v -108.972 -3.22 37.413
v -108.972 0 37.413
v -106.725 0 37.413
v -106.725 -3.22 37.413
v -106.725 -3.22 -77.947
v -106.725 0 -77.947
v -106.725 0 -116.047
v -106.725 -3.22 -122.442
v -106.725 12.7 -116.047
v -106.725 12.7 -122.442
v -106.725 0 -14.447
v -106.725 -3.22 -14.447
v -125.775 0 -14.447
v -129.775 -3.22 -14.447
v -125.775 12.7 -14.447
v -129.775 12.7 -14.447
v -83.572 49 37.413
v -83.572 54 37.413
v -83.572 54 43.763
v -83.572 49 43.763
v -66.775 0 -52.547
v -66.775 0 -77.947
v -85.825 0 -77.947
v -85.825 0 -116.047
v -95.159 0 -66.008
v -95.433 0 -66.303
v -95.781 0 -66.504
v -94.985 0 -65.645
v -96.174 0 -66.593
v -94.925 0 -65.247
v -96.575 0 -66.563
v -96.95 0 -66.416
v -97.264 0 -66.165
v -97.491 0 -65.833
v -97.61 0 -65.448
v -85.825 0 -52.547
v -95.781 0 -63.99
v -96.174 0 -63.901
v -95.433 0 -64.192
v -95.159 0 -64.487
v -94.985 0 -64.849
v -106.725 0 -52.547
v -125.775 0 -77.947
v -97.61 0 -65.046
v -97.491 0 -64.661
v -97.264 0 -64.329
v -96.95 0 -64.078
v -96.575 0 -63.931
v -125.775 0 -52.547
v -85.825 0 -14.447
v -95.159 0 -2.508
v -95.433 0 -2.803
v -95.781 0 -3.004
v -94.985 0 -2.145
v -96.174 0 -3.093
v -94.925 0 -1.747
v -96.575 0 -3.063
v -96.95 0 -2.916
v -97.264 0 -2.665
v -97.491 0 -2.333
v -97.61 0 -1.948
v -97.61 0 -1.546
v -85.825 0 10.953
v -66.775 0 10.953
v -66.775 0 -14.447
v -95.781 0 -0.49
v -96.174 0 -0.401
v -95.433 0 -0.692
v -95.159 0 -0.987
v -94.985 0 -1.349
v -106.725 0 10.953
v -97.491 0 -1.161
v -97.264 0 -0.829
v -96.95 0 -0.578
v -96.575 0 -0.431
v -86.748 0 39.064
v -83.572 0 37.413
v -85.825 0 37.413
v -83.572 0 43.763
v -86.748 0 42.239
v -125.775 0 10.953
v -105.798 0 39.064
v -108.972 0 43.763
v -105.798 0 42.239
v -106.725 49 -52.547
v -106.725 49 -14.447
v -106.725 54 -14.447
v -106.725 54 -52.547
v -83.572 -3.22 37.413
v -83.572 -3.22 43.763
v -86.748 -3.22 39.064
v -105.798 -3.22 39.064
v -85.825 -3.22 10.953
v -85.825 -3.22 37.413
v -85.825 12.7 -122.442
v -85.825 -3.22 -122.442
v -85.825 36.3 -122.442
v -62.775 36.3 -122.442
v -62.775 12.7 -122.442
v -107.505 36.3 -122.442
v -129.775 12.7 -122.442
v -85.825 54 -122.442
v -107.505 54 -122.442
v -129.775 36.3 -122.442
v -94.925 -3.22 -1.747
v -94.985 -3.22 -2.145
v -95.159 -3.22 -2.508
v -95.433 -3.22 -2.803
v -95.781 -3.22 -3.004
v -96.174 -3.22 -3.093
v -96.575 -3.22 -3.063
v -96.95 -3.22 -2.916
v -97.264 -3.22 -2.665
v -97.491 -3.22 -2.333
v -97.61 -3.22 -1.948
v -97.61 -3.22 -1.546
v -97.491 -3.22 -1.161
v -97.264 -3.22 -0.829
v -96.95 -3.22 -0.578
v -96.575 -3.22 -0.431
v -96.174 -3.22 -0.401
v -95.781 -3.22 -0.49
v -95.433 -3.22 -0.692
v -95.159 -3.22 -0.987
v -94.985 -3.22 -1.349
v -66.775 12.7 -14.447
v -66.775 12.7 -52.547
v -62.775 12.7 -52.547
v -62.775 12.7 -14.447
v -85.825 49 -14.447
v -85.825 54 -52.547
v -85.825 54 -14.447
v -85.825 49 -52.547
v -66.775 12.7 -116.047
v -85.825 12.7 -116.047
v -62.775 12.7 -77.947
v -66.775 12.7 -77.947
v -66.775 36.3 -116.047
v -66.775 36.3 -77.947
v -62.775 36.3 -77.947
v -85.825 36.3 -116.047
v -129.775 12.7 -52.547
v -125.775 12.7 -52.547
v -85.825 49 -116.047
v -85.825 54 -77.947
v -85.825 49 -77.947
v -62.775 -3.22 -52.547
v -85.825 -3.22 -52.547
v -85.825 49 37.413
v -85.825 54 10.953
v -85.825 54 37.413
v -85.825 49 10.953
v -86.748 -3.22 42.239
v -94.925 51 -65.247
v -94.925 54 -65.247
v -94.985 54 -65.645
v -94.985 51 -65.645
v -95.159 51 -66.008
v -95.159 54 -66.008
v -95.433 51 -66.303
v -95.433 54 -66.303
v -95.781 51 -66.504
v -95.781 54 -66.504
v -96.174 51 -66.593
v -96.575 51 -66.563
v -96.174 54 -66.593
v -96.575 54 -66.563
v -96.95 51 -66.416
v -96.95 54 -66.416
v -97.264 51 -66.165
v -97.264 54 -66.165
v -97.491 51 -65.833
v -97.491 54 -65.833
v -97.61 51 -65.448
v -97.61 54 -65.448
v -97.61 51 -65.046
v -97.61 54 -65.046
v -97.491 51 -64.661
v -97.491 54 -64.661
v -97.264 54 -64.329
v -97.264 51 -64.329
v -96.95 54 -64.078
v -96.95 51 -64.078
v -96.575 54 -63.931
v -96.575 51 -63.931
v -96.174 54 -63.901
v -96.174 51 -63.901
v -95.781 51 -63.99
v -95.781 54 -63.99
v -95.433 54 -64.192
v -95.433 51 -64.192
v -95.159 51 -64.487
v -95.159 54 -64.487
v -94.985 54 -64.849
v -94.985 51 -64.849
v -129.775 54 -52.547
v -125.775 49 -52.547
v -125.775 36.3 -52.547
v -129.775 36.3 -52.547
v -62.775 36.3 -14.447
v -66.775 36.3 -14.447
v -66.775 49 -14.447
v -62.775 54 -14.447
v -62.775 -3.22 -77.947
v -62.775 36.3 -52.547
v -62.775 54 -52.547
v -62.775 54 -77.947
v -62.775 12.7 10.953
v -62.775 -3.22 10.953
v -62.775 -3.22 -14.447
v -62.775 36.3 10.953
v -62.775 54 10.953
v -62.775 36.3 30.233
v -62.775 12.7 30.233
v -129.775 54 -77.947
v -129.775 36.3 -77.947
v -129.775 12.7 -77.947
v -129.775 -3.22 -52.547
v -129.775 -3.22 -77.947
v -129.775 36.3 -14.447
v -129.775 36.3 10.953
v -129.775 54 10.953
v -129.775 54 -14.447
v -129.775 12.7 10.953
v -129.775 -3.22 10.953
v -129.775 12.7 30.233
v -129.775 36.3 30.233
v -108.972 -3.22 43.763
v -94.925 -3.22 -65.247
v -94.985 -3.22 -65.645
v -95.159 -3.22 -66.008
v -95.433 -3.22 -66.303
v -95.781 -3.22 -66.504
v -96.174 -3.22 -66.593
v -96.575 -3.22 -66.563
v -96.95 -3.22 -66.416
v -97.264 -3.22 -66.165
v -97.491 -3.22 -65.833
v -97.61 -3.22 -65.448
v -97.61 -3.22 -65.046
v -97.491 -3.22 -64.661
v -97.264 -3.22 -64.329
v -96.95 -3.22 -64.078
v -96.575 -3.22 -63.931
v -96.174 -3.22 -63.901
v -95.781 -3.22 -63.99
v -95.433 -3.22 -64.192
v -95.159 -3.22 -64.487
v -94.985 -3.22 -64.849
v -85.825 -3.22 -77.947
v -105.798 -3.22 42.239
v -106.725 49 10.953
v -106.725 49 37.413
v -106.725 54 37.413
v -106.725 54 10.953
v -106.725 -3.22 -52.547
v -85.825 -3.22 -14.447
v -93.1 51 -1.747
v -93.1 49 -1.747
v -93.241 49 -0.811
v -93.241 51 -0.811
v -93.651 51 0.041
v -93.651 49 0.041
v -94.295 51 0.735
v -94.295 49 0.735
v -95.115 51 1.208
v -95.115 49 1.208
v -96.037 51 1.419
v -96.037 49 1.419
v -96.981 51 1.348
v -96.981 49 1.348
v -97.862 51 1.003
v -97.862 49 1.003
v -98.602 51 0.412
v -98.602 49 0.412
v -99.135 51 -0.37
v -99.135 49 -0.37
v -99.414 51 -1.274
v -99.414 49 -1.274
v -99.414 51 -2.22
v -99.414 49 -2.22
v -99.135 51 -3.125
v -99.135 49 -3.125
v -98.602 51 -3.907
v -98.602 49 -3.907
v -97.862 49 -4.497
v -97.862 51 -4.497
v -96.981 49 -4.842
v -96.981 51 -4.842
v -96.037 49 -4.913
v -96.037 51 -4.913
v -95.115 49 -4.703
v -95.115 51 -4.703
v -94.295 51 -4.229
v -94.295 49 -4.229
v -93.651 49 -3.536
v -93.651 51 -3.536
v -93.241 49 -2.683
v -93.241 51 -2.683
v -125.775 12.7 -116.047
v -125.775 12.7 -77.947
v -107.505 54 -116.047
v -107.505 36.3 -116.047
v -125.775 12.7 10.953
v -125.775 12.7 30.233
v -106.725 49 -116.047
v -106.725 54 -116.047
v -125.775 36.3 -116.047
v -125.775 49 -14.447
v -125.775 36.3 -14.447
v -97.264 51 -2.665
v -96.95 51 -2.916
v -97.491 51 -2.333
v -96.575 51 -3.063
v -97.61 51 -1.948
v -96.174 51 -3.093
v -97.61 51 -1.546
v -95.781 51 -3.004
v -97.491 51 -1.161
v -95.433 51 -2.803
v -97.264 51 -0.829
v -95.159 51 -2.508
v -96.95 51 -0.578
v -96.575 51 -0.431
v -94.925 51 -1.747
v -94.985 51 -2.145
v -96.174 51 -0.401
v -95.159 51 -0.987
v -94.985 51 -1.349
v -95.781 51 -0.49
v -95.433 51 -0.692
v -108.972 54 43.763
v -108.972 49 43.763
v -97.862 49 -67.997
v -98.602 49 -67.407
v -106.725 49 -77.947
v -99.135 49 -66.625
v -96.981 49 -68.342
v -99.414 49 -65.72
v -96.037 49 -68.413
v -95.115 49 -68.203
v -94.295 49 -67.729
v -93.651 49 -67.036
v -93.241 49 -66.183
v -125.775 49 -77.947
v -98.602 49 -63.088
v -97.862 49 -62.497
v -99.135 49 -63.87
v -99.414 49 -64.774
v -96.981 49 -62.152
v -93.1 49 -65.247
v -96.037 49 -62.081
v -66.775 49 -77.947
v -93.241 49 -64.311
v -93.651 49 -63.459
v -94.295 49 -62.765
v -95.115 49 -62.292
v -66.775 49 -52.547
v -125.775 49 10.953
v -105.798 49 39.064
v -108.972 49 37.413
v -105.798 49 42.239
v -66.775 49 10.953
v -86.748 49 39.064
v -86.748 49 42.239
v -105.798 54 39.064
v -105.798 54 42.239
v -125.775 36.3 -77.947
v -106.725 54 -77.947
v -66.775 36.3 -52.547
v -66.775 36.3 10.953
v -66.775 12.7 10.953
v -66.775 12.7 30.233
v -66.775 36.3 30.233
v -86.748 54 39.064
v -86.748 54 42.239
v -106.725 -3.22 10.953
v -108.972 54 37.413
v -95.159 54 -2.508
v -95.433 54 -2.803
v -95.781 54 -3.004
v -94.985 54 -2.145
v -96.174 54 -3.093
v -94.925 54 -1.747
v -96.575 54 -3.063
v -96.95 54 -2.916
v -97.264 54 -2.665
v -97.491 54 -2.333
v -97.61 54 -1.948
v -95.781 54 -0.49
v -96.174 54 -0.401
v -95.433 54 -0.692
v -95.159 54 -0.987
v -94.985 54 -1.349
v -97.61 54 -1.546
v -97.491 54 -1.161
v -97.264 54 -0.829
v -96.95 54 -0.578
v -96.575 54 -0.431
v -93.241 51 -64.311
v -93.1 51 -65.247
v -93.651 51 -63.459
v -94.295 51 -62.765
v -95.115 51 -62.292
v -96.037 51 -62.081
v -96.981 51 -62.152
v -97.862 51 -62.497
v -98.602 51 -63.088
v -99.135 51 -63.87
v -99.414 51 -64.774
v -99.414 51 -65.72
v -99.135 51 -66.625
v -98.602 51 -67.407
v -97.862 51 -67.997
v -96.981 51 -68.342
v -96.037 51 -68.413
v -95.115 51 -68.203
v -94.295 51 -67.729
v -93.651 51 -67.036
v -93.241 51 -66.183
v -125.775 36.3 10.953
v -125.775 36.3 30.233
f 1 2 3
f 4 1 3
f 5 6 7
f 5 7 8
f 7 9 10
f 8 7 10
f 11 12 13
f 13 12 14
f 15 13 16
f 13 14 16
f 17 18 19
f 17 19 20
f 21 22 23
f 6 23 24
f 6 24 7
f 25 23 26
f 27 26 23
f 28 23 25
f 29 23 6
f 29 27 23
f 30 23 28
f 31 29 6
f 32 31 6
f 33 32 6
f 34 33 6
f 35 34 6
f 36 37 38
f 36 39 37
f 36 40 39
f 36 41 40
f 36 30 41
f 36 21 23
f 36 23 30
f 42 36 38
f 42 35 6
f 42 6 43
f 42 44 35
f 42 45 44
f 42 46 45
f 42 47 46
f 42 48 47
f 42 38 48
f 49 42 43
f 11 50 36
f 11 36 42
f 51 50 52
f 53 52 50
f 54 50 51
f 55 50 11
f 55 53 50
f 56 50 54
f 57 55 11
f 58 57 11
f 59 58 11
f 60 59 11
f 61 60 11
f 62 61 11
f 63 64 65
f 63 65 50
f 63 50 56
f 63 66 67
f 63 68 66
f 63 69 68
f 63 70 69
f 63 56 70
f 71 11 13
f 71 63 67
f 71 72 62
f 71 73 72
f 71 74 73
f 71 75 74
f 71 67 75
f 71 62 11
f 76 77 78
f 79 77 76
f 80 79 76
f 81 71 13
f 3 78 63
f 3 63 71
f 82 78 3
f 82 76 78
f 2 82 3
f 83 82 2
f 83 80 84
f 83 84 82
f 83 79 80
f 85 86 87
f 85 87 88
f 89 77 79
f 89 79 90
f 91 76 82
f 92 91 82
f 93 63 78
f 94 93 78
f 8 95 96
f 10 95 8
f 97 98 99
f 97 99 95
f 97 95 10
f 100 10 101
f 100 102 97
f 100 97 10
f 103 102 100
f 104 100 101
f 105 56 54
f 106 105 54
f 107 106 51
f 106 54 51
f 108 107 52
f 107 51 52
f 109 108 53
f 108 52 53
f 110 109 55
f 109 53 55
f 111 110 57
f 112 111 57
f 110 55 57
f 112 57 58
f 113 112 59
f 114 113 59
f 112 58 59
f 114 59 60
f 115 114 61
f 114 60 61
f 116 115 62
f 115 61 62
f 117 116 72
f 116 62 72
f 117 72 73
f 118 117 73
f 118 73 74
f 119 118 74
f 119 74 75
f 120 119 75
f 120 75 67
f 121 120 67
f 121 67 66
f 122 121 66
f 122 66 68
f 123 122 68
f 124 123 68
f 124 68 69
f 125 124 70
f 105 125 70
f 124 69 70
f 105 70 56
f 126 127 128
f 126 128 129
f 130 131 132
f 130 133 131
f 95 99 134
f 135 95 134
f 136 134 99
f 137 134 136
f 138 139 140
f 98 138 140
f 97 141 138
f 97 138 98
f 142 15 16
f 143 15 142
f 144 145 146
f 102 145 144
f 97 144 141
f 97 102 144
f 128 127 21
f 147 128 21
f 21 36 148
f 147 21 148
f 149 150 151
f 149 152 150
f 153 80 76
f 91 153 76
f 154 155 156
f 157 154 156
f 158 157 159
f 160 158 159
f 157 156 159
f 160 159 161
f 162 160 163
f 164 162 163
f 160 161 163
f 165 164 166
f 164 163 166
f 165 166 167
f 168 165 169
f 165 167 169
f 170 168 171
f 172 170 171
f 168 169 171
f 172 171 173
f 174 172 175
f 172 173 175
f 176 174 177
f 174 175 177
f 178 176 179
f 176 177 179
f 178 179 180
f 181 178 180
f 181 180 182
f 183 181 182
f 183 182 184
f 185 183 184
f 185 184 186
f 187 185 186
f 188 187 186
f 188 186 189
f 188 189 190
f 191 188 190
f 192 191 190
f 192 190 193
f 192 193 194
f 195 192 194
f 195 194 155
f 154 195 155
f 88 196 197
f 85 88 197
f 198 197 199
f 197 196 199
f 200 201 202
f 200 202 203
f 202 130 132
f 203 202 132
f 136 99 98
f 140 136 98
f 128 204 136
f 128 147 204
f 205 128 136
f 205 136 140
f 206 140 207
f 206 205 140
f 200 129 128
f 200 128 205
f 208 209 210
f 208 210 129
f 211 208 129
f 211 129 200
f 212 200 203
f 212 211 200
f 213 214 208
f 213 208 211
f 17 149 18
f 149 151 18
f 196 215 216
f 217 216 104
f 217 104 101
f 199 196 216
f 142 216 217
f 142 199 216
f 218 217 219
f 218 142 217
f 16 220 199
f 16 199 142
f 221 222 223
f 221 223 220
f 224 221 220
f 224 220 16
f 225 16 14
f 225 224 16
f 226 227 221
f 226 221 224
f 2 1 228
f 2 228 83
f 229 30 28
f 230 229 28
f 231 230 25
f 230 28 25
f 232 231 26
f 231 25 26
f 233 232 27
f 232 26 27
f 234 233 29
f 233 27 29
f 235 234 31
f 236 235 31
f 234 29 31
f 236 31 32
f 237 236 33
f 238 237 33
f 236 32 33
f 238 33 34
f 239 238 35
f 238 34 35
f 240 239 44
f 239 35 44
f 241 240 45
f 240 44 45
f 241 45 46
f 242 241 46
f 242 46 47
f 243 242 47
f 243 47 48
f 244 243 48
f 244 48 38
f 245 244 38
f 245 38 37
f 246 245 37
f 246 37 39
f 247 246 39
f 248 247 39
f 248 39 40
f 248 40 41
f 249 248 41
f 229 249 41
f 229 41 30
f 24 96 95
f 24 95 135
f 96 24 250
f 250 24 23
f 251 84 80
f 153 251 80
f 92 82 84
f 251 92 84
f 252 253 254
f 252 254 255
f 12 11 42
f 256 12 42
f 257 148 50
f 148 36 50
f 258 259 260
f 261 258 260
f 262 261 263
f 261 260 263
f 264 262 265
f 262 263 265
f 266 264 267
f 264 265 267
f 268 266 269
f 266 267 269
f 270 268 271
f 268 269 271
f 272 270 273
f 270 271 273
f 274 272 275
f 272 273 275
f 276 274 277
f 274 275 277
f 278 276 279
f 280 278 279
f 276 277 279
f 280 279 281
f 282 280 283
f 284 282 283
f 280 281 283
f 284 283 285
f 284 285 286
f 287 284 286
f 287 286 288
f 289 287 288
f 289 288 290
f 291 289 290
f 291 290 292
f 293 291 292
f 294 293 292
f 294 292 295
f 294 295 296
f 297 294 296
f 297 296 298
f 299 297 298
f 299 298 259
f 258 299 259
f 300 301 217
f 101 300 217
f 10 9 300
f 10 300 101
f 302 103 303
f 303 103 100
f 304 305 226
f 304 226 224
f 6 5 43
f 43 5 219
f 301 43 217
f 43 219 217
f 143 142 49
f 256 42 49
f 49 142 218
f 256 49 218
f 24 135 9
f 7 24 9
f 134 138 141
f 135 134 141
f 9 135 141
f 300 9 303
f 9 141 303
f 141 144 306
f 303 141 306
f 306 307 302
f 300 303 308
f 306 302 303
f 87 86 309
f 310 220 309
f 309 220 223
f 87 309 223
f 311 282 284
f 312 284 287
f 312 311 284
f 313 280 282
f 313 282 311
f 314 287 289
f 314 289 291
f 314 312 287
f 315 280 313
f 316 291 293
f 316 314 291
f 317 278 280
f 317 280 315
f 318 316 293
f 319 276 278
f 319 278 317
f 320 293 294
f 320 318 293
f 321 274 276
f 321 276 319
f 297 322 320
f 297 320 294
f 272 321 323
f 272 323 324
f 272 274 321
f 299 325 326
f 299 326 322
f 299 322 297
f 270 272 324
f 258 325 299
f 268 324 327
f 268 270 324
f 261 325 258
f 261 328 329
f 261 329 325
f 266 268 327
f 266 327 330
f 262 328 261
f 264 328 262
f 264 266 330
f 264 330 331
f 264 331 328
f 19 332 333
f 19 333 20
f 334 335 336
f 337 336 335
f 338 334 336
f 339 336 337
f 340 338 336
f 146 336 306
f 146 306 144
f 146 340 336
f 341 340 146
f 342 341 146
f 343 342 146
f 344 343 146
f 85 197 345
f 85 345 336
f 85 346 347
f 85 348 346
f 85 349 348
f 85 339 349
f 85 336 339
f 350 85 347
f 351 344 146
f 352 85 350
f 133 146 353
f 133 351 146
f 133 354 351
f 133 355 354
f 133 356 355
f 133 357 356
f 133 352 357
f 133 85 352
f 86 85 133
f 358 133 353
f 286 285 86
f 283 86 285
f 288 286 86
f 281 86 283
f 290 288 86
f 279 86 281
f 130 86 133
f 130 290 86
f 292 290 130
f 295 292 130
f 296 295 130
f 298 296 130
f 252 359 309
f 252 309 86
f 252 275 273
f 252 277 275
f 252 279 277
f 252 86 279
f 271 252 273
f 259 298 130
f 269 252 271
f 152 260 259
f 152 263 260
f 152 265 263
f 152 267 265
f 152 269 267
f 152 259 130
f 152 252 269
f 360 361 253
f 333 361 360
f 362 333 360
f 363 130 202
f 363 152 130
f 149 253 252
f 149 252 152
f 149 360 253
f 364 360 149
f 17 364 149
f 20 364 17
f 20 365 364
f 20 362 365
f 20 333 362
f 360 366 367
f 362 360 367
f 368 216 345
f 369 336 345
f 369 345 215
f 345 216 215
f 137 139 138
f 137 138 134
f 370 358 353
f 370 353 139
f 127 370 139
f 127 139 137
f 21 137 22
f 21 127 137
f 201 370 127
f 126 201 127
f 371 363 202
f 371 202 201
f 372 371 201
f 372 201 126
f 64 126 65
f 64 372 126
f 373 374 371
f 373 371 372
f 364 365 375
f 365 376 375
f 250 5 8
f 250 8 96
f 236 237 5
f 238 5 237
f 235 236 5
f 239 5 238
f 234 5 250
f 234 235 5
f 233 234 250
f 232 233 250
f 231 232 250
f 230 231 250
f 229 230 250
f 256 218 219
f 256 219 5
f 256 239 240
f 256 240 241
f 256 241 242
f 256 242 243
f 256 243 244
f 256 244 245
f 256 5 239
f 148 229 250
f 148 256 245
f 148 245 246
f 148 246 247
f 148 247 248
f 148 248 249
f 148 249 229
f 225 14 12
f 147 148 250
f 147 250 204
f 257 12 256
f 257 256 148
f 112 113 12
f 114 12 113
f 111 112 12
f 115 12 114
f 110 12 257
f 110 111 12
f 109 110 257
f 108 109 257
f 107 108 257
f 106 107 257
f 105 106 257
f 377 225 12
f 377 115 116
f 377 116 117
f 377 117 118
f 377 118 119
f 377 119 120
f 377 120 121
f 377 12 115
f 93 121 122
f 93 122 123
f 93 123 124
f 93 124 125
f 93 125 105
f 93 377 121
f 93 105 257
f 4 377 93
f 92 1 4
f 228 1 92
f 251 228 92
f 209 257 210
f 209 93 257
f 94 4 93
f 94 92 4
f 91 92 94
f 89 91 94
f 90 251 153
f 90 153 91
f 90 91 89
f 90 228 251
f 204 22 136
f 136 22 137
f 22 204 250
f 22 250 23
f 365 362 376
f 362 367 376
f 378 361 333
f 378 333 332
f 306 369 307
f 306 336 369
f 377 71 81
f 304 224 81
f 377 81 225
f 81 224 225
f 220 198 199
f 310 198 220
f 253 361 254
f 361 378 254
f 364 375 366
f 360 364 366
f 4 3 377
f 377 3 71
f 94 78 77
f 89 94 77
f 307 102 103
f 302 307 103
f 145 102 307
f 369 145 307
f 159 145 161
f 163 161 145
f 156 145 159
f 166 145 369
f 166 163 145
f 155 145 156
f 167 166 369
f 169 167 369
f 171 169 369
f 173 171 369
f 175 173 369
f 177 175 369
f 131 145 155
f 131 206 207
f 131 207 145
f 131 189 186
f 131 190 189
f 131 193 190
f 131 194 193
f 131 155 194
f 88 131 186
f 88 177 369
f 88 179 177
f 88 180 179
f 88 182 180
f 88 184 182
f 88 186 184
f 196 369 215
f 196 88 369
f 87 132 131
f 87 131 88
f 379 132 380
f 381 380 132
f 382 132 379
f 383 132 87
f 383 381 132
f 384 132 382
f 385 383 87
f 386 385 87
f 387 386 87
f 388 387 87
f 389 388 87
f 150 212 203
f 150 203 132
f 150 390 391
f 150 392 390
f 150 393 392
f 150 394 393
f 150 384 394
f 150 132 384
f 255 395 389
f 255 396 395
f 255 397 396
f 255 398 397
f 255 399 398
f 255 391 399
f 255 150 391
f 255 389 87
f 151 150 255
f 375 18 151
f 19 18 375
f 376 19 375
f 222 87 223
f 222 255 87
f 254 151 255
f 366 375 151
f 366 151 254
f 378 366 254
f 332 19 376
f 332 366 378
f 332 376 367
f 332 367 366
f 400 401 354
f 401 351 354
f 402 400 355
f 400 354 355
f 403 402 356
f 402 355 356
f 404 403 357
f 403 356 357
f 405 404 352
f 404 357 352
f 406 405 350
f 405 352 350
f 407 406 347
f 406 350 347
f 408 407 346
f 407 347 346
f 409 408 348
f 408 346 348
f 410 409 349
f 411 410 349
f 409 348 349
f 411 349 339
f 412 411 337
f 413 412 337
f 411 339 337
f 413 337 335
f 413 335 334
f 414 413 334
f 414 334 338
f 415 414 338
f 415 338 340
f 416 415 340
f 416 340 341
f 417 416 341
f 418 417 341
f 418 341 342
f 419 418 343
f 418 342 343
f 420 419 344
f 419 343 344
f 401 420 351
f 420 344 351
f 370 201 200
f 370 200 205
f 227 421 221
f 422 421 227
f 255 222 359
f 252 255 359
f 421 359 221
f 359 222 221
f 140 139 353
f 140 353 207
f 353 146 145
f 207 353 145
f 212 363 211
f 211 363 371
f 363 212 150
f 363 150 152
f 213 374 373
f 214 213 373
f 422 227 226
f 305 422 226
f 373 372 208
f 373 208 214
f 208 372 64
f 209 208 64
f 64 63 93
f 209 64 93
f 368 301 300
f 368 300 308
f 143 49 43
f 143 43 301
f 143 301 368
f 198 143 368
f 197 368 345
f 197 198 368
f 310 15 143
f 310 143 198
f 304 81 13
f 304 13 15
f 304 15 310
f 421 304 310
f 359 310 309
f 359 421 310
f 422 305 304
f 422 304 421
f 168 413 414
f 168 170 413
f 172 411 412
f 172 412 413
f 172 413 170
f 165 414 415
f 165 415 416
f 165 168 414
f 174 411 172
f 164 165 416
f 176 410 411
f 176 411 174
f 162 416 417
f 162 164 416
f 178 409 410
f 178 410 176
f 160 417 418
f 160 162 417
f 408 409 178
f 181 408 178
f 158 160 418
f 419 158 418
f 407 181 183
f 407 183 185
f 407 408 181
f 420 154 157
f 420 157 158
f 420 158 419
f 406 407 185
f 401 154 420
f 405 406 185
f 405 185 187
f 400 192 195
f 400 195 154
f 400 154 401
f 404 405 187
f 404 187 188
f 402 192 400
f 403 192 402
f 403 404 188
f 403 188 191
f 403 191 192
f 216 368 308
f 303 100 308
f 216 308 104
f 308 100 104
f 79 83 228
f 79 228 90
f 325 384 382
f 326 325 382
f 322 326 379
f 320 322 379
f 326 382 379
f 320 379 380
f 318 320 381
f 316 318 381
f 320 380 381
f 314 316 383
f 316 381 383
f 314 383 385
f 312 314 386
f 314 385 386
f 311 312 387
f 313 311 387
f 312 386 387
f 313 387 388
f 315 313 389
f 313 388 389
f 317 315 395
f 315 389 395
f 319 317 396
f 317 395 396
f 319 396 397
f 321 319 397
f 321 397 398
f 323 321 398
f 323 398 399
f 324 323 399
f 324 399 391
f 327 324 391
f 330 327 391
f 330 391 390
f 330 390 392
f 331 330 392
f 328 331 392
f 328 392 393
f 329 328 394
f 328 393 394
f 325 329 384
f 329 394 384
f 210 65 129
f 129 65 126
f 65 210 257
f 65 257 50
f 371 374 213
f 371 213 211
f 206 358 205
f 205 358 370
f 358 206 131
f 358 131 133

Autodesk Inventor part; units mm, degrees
ref_plane "YZ Plane" through (0, 0, 0) normal (1, 0, 0) x (0, 1, 0)
ref_plane "XZ Plane" through (0, 0, 0) normal (0, 1, 0) x (-1, 0, 0)
ref_plane "XY Plane" through (0, 0, 0) normal (0, 0, 1) x (1, 0, 0)
sketch "Sketch1" plane through (0, 0, 0) normal (0, 1, 0) x (-1, 0, 0)
  line L0 (125.7746, -116.0471) -> (66.7746, -116.0471)
  line L1 (66.7746, -116.0471) -> (66.7746, 37.4129)
  line L2 (66.7746, 37.4129) -> (125.7746, 37.4129)
  line L3 (125.7746, 37.4129) -> (125.7746, -116.0471)
  point P0 (0, 0)
  dimension "d0" = 59
  dimension "d1" = 153.46
extrude "Extrusion1" add sketch "Sketch1" along normal blind 49
sketch "Sketch2" plane through (0, 0, 0) normal (0, -1, 0) x (1, 0, 0)
  line L0 (-125.7746, 37.4129) -> (-66.7746, 37.4129) projected
  line L1 (-66.7746, -116.0471) -> (-125.7746, -116.0471) projected
  line L2 (-85.8246, 37.4129) -> (-106.7246, 37.4129)
  line L3 (-106.7246, 37.4129) -> (-106.7246, -116.0471)
  line L4 (-106.7246, -116.0471) -> (-85.8246, -116.0471)
  line L5 (-85.8246, -116.0471) -> (-85.8246, 37.4129)
  line L6 (-66.7746, 37.4129) -> (-66.7746, -116.0471) projected
  line L7 (-125.7746, -116.0471) -> (-125.7746, 37.4129) projected
  point P0 (0, 0)
  dimension "d4" = 19.05
  dimension "d5" = 19.05
extrude "Extrusion2" add sketch "Sketch2" along normal blind 3.22 contours L0 L5 L1 L3
sketch "Sketch3" plane through (0, 49, 0) normal (0, 1, 0) x (1, 0, 0)
  line L0 (-125.7746, -37.4129) -> (-66.7746, -37.4129) projected
  line L1 (-106.7246, 116.0471) -> (-125.7746, 116.0471) projected
  line L2 (-85.8246, -37.4129) -> (-106.7246, -37.4129)
  line L3 (-106.7246, -37.4129) -> (-106.7246, 116.0471)
  line L4 (-106.7246, 116.0471) -> (-85.8246, 116.0471)
  line L5 (-85.8246, 116.0471) -> (-85.8246, -37.4129)
  line L6 (-66.7746, -37.4129) -> (-66.7746, 116.0471) projected
  line L7 (-125.7746, 116.0471) -> (-125.7746, -37.4129) projected
  point P0 (0, 0)
  dimension "d8" = 19.05
  dimension "d9" = 19.05
extrude "Extrusion3" add sketch "Sketch3" along normal blind 5 contours L3 L4 L5 L0
sketch "Sketch4" plane through (-66.7746, 0, 37.4129) normal (1, 0, 0) x (0, 0, -1)
  line L0 (0, 0) -> (0, 49) projected
  line L1 (153.46, 0) -> (153.46, 49) projected
  line L2 (0, 36.3) -> (153.46, 36.3)
  line L3 (153.46, 36.3) -> (153.46, 12.7)
  line L4 (153.46, 12.7) -> (0, 12.7)
  line L5 (0, 12.7) -> (0, 36.3)
  line L6 (0, 49) -> (153.46, 49) projected
  line L7 (0, 0) -> (153.46, 0) projected
  point P0 (37.4129, 0)
  point P1 (0, 12.7)
  dimension "d12" = 12.7
  dimension "d13" = 12.7
extrude "Extrusion4" add sketch "Sketch4" along normal blind 4 contours L0 L2 L1 L4
sketch "Sketch5" plane through (-125.7746, 0, -116.0471) normal (-1, 0, 0) x (0, 0, 1)
  line L0 (153.46, 0) -> (153.46, 49) projected
  line L1 (0, 0) -> (0, 49) projected
  line L2 (153.46, 12.7) -> (0, 12.7)
  line L3 (0, 12.7) -> (0, 36.3)
  line L4 (0, 36.3) -> (153.46, 36.3)
  line L5 (153.46, 36.3) -> (153.46, 12.7)
  line L6 (0, 0) -> (153.46, 0) projected
  line L7 (0, 49) -> (153.46, 49) projected
  point P0 (116.0471, 0)
  point P1 (0, 12.7)
  dimension "d16" = 12.7
  dimension "d17" = 12.7
extrude "Extrusion5" add sketch "Sketch5" along normal blind 4 contours L2 L1 L4 L0
sketch "Sketch6" plane through (-66.7746, 0, -116.0471) normal (0, 0, -1) x (-1, 0, 0)
  line L0 (63, -3.22) -> (-4, -3.22)
  line L1 (-4, -3.22) -> (-4, 54)
  line L2 (-4, 54) -> (63, 54)
  line L3 (63, 54) -> (63, -3.22)
  line L4 (19.05, 54) -> (39.95, 54) projected
  line L5 (63, 36.3) -> (63, 12.7) projected
  line L6 (-4, 12.7) -> (-4, 36.3) projected
  point P0 (-66.7746, 0)
  dimension "d20" = 0
  dimension "d21" = 0
  dimension "d22" = 0
extrude "Extrusion6" add sketch "Sketch6" along normal blind 6.395
sketch "Sketch7" plane through (-129.7746, 0, -116.0471) normal (-1, 0, 0) x (0, 0, 1)
  line L0 (153.46, 54) -> (0, 54) projected
  line L1 (153.46, -3.22) -> (0, -3.22) projected
  line L2 (38.1, 54) -> (63.5, 54)
  line L3 (63.5, 54) -> (63.5, -3.22)
  line L4 (63.5, -3.22) -> (38.1, -3.22)
  line L5 (38.1, -3.22) -> (38.1, 54)
  line L6 (101.6, 54) -> (127, 54)
  line L7 (127, 54) -> (127, -3.22)
  line L8 (127, -3.22) -> (101.6, -3.22)
  line L9 (101.6, -3.22) -> (101.6, 54)
  line L10 (0, 36.3) -> (0, 54) projected
  point P0 (116.0471, 0)
  point P1 (127, -3.22)
  dimension "d25" = 38.1
  dimension "d26" = 38.1
  dimension "d27" = 25.4
  dimension "d28" = 25.4
extrude "Extrusion7" add sketch "Sketch7" against normal up to surface (67 mm away) contours L7 L1 L9 L0 | L3 L1 L5 L0
sketch "Sketch8" plane through (-125.7746, 0, 37.4129) normal (0, 0, 1) x (1, 0, 0)
  line L0 (39.95, 49) -> (59, 49) projected
  line L1 (-4, 54) -> (19.05, 54) projected
  line L2 (42.2021, 49) -> (16.8021, 49)
  line L3 (16.8021, 49) -> (16.8021, 54)
  line L4 (16.8021, 54) -> (42.2021, 54)
  line L5 (42.2021, 54) -> (42.2021, 49)
  line L6 (19.05, 49) -> (19.05, 54) projected
  line L7 (0, 0) -> (19.05, 0) projected
  line L8 (39.95, -3.22) -> (63, -3.22) projected
  line L9 (16.8021, 0) -> (42.2021, 0)
  line L10 (42.2021, 0) -> (42.2021, -3.22)
  line L11 (42.2021, -3.22) -> (16.8021, -3.22)
  line L12 (16.8021, -3.22) -> (16.8021, 0)
  point P0 (125.7746, 0)
  point P1 (42.2021, 51.5)
  point P2 (16.8021, 51.5)
  point P3 (19.05, 51.5)
  dimension "d31" = 25.4
  dimension "d32" = 2.2479
extrude "Extrusion8" add sketch "Sketch8" along normal blind 6.35
sketch "Sketch9" plane through (0, 54, 0) normal (0, 1, 0) x (1, 0, 0)
  line L0 (-118.2456, -83.2824) -> (-137.2956, -83.2824)
  line L1 (-137.2956, -83.2824) -> (-137.2956, -80.1074)
  line L2 (-137.2956, -80.1074) -> (-118.2456, -80.1074)
  line L3 (-118.2456, -80.1074) -> (-118.2456, -83.2824)
  line L4 (-86.7475, -39.0639) -> (-105.7975, -39.0639)
  line L5 (-105.7975, -39.0639) -> (-105.7975, -42.2389)
  line L6 (-105.7975, -42.2389) -> (-86.7475, -42.2389)
  line L7 (-86.7475, -42.2389) -> (-86.7475, -39.0639)
  line L8 (-83.5725, -43.7629) -> (-108.9725, -43.7629) projected
  line L9 (-83.5725, -37.4129) -> (-83.5725, -43.7629) projected
  point P0 (0, 0)
  point P1 (-118.2456, -81.6949)
  point P2 (-137.2956, -81.6949)
  point P3 (-105.7975, -40.6514)
  point P4 (-86.7475, -40.6514)
  point P5 (-83.5725, -40.5879)
  dimension "d35" = 3.175
  dimension "d36" = 19.05
  dimension "d37" = 19.05
  dimension "d38" = 3.175
  dimension "d39" = 1.524
  dimension "d40" = 3.175
extrude "Extrusion9" cut sketch "Sketch9" against normal up to surface (57.22 mm away) contours L7 L6 L5 L4
sketch "Sketch10" plane through (-66.7746, 12.7, 37.4129) normal (0, 0, 1) x (1, 0, 0)
  line L0 (-59, 23.6) -> (-59, 36.3) projected
  line L1 (0, 0) -> (0, -12.7) projected
  line L2 (-59, 36.3) -> (0, 36.3)
  line L3 (0, 36.3) -> (0, -12.7)
  line L4 (0, -12.7) -> (-59, -12.7)
  line L5 (-59, -12.7) -> (-59, 36.3)
  point P0 (66.7746, -12.7)
  point P1 (-59, 23.6)
extrude "Extrusion10" cut sketch "Sketch10" against normal up to surface (153.46 mm away)
sketch "Sketch11" plane through (0, 54, 0) normal (0, 1, 0) x (1, 0, 0)
  line L0 (-85.8246, 116.0471) -> (-85.8246, 77.9471) projected
  line L1 (-129.7746, 52.5471) -> (-106.7246, 52.5471) projected
  line L2 (-85.8246, 52.5471) -> (-85.8246, 14.4471) projected
  line L3 (-129.7746, -10.9529) -> (-106.7246, -10.9529) projected
  circle A0 centre (-96.2746, 65.2471) radius 1.35
  circle A1 centre (-96.2746, 1.7471) radius 1.35
  point P0 (0, 0)
  dimension "d45" = 2.7
  dimension "d46" = 2.7
  dimension "d47" = 63.5
extrude "Extrusion11" cut sketch "Sketch11" against normal up to surface (57.22 mm away)
sketch "Sketch12" plane through (-108.9725, 49, 43.7629) normal (0, -1, 0) x (1, 0, 0)
  circle A0 centre (12.6979, -45.51) radius 1.35 projected
  circle A1 centre (12.6979, -45.51) radius 3.175
  circle A2 centre (12.6979, -109.01) radius 1.35 projected
  circle A3 centre (12.6979, -109.01) radius 3.175
  point P0 (108.9725, -43.7629)
  dimension "d50" = 6.35
  dimension "d51" = 6.35
extrude "Extrusion12" cut sketch "Sketch12" against normal blind 2 contours A0 | A1 | A2 | A3
sketch "Sketch13" plane through (-129.7746, 0, -116.0471) normal (-1, 0, 0) x (0, 0, 1)
  line L0 (153.46, 36.3) -> (127, 36.3) projected
  line L1 (127, 12.7) -> (153.46, 12.7) projected
  line L2 (153.46, 36.3) -> (146.2804, 36.3)
  line L3 (146.2804, 36.3) -> (146.2804, 12.7)
  line L4 (146.2804, 12.7) -> (153.46, 12.7)
  line L5 (153.46, 12.7) -> (153.46, 36.3)
  point P0 (116.0471, 0)
extrude "Extrusion13" cut sketch "Sketch13" against normal up to surface (67 mm away)
sketch "Sketch14" plane through (-66.7746, 0, -122.4421) normal (0, 0, -1) x (-1, 0, 0)
  line L0 (-4, 36.3) -> (-4, 54) projected
  line L1 (-4, 54) -> (19.05, 54)
  line L2 (19.05, 54) -> (19.05, 36.3)
  line L3 (19.05, 36.3) -> (-4, 36.3)
  line L4 (-4, 36.3) -> (-4, 54)
  line L5 (63, -3.22) -> (63, 54) projected
  line L6 (63, 54) -> (40.73, 54)
  line L7 (40.73, 54) -> (40.73, 36.3)
  line L8 (40.73, 36.3) -> (63, 36.3)
  line L9 (63, 36.3) -> (63, 54)
  line L10 (63, 12.7) -> (63, -3.22) projected
  line L11 (63, -3.22) -> (39.95, -3.22) projected
  line L12 (63, 12.7) -> (39.95, 12.7)
  line L13 (39.95, 12.7) -> (39.95, -3.22)
  line L14 (39.95, -3.22) -> (63, -3.22)
  line L15 (63, -3.22) -> (63, 12.7)
  line L16 (-4, 12.7) -> (-4, -3.22) projected
  line L17 (-4, -3.22) -> (19.05, -3.22)
  line L18 (19.05, -3.22) -> (19.05, 12.7)
  line L19 (19.05, 12.7) -> (-4, 12.7)
  line L20 (-4, 12.7) -> (-4, -3.22)
  point P0 (-66.7746, 0)
  point P1 (19.05, 54)
  point P2 (-4, 12.7)
  point P3 (63, 36.3)
  point P4 (63, 36.3)
  dimension "d56" = 0
  dimension "d59" = 0
  dimension "d60" = 0
extrude "Extrusion14" cut sketch "Sketch14" against normal up to surface (6.395 mm away)
properties part number "battery holder v2"
